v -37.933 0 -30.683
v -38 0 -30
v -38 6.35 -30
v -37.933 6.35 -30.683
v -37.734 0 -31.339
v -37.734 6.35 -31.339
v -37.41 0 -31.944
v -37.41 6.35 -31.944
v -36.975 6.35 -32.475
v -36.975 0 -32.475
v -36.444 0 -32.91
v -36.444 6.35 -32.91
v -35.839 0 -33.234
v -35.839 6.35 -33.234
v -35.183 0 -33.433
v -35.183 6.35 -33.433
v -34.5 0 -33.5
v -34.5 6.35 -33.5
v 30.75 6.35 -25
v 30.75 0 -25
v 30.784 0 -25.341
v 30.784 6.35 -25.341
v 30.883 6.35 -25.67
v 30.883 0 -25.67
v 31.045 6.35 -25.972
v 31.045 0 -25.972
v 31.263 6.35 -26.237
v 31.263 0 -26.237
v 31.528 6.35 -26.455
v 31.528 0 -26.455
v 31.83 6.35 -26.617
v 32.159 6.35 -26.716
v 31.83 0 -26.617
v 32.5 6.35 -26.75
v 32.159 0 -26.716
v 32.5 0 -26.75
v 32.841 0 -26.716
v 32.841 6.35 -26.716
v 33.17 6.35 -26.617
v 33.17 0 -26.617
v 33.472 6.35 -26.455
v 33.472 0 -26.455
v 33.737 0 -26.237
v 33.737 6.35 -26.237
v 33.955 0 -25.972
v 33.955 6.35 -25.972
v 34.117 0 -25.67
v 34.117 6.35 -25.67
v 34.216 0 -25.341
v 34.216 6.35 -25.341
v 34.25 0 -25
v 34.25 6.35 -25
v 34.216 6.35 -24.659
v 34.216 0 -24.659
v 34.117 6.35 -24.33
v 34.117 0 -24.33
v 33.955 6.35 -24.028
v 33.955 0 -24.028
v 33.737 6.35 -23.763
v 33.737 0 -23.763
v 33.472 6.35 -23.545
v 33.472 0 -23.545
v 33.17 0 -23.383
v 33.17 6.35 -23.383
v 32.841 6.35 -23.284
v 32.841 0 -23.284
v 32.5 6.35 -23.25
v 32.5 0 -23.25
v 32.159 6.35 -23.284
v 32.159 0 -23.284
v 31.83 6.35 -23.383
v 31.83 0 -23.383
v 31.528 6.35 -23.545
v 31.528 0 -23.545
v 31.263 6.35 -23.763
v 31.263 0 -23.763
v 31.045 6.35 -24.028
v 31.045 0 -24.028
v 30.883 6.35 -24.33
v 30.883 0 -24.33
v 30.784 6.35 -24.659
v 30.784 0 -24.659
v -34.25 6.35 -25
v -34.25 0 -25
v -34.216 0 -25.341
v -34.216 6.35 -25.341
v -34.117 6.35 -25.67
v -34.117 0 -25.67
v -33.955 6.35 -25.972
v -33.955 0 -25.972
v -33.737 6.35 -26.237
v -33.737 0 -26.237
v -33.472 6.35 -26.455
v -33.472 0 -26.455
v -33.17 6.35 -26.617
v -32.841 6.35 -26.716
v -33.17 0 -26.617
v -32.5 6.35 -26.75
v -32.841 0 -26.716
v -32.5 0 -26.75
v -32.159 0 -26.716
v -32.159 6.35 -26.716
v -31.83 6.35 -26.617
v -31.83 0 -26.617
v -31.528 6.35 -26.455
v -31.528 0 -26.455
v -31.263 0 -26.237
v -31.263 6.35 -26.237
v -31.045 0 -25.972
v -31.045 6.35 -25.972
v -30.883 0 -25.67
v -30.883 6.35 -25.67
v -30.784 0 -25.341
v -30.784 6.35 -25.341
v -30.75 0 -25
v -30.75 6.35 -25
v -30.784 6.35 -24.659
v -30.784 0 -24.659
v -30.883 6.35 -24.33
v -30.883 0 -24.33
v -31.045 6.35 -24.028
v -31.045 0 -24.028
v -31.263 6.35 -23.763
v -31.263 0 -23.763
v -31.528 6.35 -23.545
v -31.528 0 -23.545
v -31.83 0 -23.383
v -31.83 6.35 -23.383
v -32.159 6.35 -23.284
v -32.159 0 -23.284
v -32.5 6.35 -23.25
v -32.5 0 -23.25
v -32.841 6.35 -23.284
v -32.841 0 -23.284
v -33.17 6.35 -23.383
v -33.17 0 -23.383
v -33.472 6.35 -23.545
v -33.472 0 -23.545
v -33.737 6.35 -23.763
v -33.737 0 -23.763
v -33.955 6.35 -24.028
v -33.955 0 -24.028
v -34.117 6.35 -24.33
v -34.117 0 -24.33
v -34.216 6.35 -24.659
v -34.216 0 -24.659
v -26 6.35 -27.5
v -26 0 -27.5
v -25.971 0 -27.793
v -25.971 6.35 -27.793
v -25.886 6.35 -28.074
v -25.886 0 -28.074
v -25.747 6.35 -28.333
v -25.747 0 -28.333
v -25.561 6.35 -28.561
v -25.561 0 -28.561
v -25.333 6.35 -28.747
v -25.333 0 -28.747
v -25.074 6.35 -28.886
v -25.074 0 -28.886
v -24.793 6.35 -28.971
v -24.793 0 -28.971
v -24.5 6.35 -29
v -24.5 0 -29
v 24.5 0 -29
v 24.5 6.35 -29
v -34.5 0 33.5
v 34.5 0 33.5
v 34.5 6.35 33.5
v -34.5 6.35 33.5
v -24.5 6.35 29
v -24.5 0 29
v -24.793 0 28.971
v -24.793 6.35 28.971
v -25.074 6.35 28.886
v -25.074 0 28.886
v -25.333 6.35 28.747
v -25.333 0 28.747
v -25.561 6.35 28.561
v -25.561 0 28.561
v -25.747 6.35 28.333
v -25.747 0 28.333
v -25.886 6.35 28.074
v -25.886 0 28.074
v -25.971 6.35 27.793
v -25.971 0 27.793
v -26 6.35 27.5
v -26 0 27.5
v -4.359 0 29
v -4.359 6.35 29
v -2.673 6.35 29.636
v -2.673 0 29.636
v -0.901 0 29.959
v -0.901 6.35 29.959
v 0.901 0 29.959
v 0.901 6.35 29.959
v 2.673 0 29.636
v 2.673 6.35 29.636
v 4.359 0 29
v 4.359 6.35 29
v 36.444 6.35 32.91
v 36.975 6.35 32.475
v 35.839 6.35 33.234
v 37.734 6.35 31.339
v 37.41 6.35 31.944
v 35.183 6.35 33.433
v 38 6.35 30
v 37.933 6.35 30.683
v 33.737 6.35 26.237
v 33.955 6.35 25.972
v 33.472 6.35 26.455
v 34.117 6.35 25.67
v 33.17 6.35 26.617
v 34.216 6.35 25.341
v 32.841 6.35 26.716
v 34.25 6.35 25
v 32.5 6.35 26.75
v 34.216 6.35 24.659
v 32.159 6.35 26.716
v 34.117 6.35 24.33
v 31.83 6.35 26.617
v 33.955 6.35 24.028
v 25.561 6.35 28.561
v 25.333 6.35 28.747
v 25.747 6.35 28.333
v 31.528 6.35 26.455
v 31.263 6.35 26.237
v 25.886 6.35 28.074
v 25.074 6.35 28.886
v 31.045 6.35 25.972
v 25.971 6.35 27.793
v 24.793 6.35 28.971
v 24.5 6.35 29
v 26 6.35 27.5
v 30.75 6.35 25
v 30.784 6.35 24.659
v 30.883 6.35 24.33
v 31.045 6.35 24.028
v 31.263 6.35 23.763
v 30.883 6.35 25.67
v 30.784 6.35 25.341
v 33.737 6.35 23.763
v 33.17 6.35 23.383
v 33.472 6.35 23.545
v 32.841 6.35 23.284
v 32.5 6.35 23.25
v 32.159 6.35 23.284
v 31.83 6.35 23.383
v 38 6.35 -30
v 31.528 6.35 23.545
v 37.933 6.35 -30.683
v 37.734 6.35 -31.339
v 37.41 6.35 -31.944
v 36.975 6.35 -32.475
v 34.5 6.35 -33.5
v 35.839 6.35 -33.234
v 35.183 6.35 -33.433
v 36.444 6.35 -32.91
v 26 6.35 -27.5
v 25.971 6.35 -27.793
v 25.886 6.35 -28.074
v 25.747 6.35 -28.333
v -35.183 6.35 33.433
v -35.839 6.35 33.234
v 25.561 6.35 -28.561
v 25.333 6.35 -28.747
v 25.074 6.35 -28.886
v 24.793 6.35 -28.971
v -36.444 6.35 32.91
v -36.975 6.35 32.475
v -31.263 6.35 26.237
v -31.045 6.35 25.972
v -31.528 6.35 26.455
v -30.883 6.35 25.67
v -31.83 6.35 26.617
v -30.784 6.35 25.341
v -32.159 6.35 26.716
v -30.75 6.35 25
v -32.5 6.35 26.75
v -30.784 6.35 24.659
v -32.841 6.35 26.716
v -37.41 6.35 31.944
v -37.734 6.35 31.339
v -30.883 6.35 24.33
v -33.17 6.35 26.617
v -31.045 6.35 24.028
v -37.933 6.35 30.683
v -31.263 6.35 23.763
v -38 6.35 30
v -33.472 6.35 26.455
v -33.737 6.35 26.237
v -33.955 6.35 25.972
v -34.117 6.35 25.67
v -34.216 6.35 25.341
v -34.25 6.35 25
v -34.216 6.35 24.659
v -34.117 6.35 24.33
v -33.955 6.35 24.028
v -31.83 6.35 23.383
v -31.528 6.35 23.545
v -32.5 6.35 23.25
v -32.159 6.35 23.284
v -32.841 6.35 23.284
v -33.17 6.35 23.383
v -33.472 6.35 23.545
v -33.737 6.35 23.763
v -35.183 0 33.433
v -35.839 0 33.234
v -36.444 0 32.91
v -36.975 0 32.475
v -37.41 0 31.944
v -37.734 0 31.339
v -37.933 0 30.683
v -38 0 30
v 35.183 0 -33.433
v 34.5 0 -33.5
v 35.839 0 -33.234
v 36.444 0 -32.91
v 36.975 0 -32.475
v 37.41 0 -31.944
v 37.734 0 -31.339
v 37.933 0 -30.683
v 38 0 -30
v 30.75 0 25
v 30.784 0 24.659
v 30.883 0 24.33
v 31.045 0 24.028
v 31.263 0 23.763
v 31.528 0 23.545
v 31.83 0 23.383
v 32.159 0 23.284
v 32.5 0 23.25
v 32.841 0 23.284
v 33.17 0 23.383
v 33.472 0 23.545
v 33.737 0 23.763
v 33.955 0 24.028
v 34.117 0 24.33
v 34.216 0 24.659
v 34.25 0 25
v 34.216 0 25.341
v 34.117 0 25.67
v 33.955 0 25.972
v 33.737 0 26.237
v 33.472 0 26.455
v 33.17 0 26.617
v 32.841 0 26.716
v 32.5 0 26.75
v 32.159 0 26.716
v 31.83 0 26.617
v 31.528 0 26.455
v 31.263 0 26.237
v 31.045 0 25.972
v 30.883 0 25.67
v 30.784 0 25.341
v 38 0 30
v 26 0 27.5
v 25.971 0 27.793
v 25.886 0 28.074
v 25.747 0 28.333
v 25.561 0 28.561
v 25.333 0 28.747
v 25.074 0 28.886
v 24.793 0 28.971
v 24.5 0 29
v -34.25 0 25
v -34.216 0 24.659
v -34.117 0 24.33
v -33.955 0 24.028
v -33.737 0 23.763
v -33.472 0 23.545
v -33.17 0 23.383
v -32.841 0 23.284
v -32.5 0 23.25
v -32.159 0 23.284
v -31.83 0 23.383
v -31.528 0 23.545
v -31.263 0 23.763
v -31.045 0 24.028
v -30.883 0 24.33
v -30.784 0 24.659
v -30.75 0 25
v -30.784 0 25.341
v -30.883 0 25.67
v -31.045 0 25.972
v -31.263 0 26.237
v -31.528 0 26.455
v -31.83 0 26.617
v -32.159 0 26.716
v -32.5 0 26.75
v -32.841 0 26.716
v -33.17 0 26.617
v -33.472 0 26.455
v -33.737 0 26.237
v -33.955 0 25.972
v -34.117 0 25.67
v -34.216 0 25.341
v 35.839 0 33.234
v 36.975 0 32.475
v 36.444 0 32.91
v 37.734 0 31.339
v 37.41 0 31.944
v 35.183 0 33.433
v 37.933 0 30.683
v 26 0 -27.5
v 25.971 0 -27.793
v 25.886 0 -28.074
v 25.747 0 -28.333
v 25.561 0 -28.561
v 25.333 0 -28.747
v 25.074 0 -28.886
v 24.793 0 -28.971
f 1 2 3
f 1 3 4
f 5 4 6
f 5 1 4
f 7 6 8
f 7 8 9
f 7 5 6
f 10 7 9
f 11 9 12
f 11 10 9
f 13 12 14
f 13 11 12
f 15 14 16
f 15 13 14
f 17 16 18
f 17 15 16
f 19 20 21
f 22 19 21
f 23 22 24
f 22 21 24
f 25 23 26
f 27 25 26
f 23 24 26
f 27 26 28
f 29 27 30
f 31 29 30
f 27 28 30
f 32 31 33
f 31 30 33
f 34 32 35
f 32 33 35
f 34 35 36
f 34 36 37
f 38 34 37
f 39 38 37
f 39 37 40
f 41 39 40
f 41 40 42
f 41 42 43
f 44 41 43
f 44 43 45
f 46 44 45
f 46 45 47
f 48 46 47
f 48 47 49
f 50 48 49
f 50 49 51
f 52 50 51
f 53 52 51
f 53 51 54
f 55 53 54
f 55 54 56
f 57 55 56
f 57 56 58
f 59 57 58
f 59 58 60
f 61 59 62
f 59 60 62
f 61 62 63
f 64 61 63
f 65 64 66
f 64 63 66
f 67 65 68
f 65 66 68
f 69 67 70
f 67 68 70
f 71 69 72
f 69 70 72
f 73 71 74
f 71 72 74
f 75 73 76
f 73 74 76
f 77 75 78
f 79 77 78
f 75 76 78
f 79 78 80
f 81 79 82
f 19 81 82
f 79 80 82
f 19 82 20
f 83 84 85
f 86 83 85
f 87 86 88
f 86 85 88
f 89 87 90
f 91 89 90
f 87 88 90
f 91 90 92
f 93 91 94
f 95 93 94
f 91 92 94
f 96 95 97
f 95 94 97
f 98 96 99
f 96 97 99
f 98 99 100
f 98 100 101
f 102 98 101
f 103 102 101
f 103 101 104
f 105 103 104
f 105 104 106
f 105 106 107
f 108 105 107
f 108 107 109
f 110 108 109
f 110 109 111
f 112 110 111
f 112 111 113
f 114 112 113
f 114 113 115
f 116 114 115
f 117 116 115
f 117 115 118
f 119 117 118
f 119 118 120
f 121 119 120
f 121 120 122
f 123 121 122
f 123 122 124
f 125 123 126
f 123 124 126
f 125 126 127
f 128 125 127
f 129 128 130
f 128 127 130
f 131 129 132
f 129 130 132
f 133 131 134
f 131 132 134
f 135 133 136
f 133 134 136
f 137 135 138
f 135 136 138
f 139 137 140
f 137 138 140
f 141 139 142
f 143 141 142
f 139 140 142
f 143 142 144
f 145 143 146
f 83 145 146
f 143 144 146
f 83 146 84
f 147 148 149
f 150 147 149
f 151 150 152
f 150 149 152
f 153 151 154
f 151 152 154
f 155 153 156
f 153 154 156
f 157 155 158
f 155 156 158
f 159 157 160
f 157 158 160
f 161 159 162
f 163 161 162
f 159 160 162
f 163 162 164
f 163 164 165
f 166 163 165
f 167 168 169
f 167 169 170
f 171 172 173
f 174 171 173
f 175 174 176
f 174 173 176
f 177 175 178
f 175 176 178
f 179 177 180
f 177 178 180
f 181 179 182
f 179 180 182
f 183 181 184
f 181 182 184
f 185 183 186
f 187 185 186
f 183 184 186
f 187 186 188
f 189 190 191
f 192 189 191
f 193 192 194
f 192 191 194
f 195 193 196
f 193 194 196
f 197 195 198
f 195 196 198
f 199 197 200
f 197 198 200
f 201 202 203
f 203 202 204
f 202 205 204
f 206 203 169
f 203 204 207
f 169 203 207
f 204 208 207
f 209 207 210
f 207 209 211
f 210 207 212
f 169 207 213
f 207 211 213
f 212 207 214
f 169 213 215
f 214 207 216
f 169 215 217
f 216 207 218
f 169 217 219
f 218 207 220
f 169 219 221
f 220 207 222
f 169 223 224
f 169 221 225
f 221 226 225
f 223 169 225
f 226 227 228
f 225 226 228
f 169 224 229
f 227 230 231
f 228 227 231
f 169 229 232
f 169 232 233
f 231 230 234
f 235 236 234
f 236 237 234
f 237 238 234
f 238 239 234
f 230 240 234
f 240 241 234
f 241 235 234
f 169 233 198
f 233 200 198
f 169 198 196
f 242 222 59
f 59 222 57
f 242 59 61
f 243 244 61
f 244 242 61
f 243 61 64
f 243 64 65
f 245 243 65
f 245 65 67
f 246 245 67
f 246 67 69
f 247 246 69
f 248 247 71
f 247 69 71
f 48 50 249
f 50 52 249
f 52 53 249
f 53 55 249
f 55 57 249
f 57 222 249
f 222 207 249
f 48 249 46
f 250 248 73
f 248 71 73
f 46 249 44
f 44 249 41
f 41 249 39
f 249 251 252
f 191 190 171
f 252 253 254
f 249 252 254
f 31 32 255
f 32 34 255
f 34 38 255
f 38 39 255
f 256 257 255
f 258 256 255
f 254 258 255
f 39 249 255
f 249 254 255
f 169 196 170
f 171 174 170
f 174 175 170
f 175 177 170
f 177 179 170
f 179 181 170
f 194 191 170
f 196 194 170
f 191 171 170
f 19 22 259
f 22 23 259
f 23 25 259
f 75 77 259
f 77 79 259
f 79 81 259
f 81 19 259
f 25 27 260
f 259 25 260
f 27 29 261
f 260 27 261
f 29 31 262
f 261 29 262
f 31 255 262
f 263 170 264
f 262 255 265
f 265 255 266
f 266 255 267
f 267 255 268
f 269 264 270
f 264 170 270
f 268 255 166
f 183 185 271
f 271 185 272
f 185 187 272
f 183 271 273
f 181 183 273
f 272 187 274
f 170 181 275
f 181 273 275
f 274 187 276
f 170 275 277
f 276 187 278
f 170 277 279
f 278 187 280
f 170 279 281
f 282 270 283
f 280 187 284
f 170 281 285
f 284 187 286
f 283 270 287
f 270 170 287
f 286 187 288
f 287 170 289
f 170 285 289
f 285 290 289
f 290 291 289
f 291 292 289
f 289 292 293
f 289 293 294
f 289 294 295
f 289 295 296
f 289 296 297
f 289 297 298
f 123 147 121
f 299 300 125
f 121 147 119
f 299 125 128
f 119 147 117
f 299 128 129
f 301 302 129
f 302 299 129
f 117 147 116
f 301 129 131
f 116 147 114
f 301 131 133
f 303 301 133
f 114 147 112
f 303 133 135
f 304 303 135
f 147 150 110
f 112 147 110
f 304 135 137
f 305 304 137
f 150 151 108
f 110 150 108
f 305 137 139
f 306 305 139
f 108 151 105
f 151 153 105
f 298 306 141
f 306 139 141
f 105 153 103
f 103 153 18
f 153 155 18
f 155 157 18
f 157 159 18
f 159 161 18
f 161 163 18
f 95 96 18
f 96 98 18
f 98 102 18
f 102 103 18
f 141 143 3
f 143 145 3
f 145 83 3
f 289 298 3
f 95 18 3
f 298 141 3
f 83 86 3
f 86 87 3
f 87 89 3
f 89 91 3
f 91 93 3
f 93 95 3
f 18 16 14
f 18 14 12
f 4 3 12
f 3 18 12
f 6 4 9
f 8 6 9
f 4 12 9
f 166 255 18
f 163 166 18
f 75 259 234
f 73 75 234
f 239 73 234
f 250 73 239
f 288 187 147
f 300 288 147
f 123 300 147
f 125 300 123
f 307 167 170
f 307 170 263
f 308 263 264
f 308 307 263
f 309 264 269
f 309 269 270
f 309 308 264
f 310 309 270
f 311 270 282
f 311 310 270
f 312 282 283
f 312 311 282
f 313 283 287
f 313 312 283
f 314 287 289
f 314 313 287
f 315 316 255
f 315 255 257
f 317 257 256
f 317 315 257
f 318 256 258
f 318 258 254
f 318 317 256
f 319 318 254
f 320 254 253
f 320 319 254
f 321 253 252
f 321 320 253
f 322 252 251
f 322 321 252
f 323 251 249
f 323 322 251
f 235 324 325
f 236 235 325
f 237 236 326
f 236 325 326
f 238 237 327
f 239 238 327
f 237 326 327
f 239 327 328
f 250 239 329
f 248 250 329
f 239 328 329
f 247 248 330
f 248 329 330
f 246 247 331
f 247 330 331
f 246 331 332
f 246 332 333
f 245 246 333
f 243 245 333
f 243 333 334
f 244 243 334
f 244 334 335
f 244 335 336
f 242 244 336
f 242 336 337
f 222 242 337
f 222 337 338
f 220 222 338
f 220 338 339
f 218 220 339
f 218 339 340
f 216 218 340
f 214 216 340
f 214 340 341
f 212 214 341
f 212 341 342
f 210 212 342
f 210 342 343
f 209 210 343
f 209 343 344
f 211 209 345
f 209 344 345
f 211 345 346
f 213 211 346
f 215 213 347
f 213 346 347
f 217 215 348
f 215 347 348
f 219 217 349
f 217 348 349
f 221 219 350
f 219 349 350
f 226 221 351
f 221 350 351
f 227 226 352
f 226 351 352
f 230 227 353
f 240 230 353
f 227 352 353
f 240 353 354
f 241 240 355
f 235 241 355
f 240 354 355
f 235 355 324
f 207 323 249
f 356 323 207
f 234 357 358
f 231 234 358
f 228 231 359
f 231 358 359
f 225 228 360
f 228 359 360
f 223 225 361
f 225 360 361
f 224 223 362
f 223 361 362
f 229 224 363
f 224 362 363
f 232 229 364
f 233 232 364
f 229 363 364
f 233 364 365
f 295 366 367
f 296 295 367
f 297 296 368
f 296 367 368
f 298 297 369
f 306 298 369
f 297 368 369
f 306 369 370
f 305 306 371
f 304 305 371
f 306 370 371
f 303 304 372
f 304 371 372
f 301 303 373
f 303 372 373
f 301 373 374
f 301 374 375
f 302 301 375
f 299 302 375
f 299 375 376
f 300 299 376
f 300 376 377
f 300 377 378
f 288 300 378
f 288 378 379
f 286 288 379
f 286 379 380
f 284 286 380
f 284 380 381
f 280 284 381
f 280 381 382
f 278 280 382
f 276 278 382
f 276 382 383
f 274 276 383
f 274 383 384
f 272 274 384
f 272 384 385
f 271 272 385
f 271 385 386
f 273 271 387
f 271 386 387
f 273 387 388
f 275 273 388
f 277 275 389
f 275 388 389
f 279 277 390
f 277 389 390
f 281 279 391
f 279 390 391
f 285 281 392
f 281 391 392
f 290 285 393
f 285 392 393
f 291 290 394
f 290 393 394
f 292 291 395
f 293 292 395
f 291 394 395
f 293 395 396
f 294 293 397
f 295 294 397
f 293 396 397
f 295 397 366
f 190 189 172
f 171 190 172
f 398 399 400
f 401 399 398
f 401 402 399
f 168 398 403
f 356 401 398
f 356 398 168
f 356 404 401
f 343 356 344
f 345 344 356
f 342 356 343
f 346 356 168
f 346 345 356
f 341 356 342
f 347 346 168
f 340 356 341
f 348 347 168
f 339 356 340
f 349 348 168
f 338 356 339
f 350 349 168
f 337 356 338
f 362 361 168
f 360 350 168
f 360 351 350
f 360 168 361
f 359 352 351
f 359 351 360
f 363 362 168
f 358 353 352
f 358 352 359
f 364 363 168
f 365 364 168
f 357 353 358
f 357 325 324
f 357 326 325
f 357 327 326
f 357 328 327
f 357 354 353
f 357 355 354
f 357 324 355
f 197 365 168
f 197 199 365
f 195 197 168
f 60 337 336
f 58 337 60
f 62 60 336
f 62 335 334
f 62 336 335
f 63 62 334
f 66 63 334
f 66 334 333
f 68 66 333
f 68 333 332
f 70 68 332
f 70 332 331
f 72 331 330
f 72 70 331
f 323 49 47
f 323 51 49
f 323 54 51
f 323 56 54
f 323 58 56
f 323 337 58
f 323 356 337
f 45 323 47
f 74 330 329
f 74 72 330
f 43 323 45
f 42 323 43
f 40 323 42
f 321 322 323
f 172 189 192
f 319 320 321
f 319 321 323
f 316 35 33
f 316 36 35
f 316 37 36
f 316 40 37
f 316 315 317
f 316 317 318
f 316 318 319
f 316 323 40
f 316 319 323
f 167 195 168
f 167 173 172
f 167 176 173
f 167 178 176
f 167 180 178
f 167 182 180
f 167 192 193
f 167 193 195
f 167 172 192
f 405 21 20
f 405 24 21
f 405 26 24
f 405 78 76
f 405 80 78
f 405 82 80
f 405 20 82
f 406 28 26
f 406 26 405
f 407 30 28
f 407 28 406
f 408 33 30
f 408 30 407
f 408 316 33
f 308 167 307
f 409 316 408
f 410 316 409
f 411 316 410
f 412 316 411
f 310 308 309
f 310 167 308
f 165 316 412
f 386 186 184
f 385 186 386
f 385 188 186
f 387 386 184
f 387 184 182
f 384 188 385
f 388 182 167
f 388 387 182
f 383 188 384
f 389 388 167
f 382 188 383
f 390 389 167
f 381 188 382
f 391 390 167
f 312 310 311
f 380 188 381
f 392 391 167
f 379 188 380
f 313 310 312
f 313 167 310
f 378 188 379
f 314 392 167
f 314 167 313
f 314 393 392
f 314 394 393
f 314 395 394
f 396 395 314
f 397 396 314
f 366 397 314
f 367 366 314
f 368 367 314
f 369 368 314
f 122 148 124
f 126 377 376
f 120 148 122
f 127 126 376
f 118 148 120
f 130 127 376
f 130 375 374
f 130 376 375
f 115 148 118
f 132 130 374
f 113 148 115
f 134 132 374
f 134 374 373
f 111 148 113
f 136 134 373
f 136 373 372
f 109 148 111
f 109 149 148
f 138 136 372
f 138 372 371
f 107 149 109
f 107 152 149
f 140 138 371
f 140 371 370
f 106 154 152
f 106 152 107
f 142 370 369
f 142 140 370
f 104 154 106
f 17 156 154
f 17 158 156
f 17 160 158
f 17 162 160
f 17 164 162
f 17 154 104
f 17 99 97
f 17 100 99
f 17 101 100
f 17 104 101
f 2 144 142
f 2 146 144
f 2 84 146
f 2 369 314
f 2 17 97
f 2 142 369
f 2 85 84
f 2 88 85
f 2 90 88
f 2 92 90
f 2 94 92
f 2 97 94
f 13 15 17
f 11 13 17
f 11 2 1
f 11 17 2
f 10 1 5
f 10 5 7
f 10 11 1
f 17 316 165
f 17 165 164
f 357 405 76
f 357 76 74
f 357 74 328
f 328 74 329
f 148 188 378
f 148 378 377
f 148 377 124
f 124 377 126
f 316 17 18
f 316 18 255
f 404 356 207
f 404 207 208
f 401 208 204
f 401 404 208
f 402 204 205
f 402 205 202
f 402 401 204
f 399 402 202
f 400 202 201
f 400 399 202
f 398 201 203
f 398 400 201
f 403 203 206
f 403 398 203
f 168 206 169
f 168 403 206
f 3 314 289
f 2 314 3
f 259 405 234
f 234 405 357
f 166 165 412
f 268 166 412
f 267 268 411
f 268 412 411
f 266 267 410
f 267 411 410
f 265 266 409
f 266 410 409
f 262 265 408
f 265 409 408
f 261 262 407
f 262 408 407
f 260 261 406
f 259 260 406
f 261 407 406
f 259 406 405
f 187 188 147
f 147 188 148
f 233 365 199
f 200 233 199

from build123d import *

# Parameters (mm, degrees)
BOSS_EXTRUDE1_DEPTH         = 6.35
TAP_DRILL_FOR_M5X0_8_TAP1_D = 3.5
SKETCH4_R                   = 10
CUT_EXTRUDE1_DEPTH          = 52.054603123


with BuildPart() as part:
    # Sketch1 → Boss-Extrude1 (new body)
    with BuildSketch(Plane(origin=(0, 0, 0), x_dir=(1, 0, 0), z_dir=(0, 1, 0))):
        with BuildLine():
            Line((34.5, -33.5), (-34.5, -33.5))
            ThreePointArc((-34.5, -33.5), (-36.974873734, -32.474873734), (-38, -30))
            Line((-38, -30), (-38, 30))
            ThreePointArc((-38, 30), (-36.974873734, 32.474873734), (-34.5, 33.5))
            Line((-34.5, 33.5), (34.5, 33.5))
            ThreePointArc((34.5, 33.5), (36.974873734, 32.474873734), (38, 30))
            Line((38, 30), (38, -30))
            ThreePointArc((38, -30), (36.974873734, -32.474873734), (34.5, -33.5))
        make_face()
        with BuildLine():
            Line((24.5, -29), (-24.5, -29))
            ThreePointArc((-24.5, -29), (-25.560660172, -28.560660172), (-26, -27.5))
            Line((-26, -27.5), (-26, 27.5))
            ThreePointArc((-26, 27.5), (-25.560660172, 28.560660172), (-24.5, 29))
            Line((-24.5, 29), (24.5, 29))
            ThreePointArc((24.5, 29), (25.560660172, 28.560660172), (26, 27.5))
            Line((26, 27.5), (26, -27.5))
            ThreePointArc((26, -27.5), (25.560660172, -28.560660172), (24.5, -29))
        make_face(mode=Mode.SUBTRACT)
    extrude(amount=BOSS_EXTRUDE1_DEPTH)

    # Tap Drill for M5x0.8 Tap1 (through all)
    with Locations(Plane(origin=(0, 6.35, 0), x_dir=(1, 0, 0), z_dir=(0, 1, 0))):
        with Locations((-32.5, -25), (-32.5, 25), (32.5, -25), (32.5, 25)):
            Hole(TAP_DRILL_FOR_M5X0_8_TAP1_D / 2)

    # Sketch4 → Cut-Extrude1 (cut, through all)
    with BuildSketch(Plane(origin=(0, 6.35, 0), x_dir=(1, 0, 0), z_dir=(0, 1, 0))):
        with Locations((0, -20)):
            Circle(SKETCH4_R)
    extrude(amount=-CUT_EXTRUDE1_DEPTH, mode=Mode.SUBTRACT)


solid = part.part
